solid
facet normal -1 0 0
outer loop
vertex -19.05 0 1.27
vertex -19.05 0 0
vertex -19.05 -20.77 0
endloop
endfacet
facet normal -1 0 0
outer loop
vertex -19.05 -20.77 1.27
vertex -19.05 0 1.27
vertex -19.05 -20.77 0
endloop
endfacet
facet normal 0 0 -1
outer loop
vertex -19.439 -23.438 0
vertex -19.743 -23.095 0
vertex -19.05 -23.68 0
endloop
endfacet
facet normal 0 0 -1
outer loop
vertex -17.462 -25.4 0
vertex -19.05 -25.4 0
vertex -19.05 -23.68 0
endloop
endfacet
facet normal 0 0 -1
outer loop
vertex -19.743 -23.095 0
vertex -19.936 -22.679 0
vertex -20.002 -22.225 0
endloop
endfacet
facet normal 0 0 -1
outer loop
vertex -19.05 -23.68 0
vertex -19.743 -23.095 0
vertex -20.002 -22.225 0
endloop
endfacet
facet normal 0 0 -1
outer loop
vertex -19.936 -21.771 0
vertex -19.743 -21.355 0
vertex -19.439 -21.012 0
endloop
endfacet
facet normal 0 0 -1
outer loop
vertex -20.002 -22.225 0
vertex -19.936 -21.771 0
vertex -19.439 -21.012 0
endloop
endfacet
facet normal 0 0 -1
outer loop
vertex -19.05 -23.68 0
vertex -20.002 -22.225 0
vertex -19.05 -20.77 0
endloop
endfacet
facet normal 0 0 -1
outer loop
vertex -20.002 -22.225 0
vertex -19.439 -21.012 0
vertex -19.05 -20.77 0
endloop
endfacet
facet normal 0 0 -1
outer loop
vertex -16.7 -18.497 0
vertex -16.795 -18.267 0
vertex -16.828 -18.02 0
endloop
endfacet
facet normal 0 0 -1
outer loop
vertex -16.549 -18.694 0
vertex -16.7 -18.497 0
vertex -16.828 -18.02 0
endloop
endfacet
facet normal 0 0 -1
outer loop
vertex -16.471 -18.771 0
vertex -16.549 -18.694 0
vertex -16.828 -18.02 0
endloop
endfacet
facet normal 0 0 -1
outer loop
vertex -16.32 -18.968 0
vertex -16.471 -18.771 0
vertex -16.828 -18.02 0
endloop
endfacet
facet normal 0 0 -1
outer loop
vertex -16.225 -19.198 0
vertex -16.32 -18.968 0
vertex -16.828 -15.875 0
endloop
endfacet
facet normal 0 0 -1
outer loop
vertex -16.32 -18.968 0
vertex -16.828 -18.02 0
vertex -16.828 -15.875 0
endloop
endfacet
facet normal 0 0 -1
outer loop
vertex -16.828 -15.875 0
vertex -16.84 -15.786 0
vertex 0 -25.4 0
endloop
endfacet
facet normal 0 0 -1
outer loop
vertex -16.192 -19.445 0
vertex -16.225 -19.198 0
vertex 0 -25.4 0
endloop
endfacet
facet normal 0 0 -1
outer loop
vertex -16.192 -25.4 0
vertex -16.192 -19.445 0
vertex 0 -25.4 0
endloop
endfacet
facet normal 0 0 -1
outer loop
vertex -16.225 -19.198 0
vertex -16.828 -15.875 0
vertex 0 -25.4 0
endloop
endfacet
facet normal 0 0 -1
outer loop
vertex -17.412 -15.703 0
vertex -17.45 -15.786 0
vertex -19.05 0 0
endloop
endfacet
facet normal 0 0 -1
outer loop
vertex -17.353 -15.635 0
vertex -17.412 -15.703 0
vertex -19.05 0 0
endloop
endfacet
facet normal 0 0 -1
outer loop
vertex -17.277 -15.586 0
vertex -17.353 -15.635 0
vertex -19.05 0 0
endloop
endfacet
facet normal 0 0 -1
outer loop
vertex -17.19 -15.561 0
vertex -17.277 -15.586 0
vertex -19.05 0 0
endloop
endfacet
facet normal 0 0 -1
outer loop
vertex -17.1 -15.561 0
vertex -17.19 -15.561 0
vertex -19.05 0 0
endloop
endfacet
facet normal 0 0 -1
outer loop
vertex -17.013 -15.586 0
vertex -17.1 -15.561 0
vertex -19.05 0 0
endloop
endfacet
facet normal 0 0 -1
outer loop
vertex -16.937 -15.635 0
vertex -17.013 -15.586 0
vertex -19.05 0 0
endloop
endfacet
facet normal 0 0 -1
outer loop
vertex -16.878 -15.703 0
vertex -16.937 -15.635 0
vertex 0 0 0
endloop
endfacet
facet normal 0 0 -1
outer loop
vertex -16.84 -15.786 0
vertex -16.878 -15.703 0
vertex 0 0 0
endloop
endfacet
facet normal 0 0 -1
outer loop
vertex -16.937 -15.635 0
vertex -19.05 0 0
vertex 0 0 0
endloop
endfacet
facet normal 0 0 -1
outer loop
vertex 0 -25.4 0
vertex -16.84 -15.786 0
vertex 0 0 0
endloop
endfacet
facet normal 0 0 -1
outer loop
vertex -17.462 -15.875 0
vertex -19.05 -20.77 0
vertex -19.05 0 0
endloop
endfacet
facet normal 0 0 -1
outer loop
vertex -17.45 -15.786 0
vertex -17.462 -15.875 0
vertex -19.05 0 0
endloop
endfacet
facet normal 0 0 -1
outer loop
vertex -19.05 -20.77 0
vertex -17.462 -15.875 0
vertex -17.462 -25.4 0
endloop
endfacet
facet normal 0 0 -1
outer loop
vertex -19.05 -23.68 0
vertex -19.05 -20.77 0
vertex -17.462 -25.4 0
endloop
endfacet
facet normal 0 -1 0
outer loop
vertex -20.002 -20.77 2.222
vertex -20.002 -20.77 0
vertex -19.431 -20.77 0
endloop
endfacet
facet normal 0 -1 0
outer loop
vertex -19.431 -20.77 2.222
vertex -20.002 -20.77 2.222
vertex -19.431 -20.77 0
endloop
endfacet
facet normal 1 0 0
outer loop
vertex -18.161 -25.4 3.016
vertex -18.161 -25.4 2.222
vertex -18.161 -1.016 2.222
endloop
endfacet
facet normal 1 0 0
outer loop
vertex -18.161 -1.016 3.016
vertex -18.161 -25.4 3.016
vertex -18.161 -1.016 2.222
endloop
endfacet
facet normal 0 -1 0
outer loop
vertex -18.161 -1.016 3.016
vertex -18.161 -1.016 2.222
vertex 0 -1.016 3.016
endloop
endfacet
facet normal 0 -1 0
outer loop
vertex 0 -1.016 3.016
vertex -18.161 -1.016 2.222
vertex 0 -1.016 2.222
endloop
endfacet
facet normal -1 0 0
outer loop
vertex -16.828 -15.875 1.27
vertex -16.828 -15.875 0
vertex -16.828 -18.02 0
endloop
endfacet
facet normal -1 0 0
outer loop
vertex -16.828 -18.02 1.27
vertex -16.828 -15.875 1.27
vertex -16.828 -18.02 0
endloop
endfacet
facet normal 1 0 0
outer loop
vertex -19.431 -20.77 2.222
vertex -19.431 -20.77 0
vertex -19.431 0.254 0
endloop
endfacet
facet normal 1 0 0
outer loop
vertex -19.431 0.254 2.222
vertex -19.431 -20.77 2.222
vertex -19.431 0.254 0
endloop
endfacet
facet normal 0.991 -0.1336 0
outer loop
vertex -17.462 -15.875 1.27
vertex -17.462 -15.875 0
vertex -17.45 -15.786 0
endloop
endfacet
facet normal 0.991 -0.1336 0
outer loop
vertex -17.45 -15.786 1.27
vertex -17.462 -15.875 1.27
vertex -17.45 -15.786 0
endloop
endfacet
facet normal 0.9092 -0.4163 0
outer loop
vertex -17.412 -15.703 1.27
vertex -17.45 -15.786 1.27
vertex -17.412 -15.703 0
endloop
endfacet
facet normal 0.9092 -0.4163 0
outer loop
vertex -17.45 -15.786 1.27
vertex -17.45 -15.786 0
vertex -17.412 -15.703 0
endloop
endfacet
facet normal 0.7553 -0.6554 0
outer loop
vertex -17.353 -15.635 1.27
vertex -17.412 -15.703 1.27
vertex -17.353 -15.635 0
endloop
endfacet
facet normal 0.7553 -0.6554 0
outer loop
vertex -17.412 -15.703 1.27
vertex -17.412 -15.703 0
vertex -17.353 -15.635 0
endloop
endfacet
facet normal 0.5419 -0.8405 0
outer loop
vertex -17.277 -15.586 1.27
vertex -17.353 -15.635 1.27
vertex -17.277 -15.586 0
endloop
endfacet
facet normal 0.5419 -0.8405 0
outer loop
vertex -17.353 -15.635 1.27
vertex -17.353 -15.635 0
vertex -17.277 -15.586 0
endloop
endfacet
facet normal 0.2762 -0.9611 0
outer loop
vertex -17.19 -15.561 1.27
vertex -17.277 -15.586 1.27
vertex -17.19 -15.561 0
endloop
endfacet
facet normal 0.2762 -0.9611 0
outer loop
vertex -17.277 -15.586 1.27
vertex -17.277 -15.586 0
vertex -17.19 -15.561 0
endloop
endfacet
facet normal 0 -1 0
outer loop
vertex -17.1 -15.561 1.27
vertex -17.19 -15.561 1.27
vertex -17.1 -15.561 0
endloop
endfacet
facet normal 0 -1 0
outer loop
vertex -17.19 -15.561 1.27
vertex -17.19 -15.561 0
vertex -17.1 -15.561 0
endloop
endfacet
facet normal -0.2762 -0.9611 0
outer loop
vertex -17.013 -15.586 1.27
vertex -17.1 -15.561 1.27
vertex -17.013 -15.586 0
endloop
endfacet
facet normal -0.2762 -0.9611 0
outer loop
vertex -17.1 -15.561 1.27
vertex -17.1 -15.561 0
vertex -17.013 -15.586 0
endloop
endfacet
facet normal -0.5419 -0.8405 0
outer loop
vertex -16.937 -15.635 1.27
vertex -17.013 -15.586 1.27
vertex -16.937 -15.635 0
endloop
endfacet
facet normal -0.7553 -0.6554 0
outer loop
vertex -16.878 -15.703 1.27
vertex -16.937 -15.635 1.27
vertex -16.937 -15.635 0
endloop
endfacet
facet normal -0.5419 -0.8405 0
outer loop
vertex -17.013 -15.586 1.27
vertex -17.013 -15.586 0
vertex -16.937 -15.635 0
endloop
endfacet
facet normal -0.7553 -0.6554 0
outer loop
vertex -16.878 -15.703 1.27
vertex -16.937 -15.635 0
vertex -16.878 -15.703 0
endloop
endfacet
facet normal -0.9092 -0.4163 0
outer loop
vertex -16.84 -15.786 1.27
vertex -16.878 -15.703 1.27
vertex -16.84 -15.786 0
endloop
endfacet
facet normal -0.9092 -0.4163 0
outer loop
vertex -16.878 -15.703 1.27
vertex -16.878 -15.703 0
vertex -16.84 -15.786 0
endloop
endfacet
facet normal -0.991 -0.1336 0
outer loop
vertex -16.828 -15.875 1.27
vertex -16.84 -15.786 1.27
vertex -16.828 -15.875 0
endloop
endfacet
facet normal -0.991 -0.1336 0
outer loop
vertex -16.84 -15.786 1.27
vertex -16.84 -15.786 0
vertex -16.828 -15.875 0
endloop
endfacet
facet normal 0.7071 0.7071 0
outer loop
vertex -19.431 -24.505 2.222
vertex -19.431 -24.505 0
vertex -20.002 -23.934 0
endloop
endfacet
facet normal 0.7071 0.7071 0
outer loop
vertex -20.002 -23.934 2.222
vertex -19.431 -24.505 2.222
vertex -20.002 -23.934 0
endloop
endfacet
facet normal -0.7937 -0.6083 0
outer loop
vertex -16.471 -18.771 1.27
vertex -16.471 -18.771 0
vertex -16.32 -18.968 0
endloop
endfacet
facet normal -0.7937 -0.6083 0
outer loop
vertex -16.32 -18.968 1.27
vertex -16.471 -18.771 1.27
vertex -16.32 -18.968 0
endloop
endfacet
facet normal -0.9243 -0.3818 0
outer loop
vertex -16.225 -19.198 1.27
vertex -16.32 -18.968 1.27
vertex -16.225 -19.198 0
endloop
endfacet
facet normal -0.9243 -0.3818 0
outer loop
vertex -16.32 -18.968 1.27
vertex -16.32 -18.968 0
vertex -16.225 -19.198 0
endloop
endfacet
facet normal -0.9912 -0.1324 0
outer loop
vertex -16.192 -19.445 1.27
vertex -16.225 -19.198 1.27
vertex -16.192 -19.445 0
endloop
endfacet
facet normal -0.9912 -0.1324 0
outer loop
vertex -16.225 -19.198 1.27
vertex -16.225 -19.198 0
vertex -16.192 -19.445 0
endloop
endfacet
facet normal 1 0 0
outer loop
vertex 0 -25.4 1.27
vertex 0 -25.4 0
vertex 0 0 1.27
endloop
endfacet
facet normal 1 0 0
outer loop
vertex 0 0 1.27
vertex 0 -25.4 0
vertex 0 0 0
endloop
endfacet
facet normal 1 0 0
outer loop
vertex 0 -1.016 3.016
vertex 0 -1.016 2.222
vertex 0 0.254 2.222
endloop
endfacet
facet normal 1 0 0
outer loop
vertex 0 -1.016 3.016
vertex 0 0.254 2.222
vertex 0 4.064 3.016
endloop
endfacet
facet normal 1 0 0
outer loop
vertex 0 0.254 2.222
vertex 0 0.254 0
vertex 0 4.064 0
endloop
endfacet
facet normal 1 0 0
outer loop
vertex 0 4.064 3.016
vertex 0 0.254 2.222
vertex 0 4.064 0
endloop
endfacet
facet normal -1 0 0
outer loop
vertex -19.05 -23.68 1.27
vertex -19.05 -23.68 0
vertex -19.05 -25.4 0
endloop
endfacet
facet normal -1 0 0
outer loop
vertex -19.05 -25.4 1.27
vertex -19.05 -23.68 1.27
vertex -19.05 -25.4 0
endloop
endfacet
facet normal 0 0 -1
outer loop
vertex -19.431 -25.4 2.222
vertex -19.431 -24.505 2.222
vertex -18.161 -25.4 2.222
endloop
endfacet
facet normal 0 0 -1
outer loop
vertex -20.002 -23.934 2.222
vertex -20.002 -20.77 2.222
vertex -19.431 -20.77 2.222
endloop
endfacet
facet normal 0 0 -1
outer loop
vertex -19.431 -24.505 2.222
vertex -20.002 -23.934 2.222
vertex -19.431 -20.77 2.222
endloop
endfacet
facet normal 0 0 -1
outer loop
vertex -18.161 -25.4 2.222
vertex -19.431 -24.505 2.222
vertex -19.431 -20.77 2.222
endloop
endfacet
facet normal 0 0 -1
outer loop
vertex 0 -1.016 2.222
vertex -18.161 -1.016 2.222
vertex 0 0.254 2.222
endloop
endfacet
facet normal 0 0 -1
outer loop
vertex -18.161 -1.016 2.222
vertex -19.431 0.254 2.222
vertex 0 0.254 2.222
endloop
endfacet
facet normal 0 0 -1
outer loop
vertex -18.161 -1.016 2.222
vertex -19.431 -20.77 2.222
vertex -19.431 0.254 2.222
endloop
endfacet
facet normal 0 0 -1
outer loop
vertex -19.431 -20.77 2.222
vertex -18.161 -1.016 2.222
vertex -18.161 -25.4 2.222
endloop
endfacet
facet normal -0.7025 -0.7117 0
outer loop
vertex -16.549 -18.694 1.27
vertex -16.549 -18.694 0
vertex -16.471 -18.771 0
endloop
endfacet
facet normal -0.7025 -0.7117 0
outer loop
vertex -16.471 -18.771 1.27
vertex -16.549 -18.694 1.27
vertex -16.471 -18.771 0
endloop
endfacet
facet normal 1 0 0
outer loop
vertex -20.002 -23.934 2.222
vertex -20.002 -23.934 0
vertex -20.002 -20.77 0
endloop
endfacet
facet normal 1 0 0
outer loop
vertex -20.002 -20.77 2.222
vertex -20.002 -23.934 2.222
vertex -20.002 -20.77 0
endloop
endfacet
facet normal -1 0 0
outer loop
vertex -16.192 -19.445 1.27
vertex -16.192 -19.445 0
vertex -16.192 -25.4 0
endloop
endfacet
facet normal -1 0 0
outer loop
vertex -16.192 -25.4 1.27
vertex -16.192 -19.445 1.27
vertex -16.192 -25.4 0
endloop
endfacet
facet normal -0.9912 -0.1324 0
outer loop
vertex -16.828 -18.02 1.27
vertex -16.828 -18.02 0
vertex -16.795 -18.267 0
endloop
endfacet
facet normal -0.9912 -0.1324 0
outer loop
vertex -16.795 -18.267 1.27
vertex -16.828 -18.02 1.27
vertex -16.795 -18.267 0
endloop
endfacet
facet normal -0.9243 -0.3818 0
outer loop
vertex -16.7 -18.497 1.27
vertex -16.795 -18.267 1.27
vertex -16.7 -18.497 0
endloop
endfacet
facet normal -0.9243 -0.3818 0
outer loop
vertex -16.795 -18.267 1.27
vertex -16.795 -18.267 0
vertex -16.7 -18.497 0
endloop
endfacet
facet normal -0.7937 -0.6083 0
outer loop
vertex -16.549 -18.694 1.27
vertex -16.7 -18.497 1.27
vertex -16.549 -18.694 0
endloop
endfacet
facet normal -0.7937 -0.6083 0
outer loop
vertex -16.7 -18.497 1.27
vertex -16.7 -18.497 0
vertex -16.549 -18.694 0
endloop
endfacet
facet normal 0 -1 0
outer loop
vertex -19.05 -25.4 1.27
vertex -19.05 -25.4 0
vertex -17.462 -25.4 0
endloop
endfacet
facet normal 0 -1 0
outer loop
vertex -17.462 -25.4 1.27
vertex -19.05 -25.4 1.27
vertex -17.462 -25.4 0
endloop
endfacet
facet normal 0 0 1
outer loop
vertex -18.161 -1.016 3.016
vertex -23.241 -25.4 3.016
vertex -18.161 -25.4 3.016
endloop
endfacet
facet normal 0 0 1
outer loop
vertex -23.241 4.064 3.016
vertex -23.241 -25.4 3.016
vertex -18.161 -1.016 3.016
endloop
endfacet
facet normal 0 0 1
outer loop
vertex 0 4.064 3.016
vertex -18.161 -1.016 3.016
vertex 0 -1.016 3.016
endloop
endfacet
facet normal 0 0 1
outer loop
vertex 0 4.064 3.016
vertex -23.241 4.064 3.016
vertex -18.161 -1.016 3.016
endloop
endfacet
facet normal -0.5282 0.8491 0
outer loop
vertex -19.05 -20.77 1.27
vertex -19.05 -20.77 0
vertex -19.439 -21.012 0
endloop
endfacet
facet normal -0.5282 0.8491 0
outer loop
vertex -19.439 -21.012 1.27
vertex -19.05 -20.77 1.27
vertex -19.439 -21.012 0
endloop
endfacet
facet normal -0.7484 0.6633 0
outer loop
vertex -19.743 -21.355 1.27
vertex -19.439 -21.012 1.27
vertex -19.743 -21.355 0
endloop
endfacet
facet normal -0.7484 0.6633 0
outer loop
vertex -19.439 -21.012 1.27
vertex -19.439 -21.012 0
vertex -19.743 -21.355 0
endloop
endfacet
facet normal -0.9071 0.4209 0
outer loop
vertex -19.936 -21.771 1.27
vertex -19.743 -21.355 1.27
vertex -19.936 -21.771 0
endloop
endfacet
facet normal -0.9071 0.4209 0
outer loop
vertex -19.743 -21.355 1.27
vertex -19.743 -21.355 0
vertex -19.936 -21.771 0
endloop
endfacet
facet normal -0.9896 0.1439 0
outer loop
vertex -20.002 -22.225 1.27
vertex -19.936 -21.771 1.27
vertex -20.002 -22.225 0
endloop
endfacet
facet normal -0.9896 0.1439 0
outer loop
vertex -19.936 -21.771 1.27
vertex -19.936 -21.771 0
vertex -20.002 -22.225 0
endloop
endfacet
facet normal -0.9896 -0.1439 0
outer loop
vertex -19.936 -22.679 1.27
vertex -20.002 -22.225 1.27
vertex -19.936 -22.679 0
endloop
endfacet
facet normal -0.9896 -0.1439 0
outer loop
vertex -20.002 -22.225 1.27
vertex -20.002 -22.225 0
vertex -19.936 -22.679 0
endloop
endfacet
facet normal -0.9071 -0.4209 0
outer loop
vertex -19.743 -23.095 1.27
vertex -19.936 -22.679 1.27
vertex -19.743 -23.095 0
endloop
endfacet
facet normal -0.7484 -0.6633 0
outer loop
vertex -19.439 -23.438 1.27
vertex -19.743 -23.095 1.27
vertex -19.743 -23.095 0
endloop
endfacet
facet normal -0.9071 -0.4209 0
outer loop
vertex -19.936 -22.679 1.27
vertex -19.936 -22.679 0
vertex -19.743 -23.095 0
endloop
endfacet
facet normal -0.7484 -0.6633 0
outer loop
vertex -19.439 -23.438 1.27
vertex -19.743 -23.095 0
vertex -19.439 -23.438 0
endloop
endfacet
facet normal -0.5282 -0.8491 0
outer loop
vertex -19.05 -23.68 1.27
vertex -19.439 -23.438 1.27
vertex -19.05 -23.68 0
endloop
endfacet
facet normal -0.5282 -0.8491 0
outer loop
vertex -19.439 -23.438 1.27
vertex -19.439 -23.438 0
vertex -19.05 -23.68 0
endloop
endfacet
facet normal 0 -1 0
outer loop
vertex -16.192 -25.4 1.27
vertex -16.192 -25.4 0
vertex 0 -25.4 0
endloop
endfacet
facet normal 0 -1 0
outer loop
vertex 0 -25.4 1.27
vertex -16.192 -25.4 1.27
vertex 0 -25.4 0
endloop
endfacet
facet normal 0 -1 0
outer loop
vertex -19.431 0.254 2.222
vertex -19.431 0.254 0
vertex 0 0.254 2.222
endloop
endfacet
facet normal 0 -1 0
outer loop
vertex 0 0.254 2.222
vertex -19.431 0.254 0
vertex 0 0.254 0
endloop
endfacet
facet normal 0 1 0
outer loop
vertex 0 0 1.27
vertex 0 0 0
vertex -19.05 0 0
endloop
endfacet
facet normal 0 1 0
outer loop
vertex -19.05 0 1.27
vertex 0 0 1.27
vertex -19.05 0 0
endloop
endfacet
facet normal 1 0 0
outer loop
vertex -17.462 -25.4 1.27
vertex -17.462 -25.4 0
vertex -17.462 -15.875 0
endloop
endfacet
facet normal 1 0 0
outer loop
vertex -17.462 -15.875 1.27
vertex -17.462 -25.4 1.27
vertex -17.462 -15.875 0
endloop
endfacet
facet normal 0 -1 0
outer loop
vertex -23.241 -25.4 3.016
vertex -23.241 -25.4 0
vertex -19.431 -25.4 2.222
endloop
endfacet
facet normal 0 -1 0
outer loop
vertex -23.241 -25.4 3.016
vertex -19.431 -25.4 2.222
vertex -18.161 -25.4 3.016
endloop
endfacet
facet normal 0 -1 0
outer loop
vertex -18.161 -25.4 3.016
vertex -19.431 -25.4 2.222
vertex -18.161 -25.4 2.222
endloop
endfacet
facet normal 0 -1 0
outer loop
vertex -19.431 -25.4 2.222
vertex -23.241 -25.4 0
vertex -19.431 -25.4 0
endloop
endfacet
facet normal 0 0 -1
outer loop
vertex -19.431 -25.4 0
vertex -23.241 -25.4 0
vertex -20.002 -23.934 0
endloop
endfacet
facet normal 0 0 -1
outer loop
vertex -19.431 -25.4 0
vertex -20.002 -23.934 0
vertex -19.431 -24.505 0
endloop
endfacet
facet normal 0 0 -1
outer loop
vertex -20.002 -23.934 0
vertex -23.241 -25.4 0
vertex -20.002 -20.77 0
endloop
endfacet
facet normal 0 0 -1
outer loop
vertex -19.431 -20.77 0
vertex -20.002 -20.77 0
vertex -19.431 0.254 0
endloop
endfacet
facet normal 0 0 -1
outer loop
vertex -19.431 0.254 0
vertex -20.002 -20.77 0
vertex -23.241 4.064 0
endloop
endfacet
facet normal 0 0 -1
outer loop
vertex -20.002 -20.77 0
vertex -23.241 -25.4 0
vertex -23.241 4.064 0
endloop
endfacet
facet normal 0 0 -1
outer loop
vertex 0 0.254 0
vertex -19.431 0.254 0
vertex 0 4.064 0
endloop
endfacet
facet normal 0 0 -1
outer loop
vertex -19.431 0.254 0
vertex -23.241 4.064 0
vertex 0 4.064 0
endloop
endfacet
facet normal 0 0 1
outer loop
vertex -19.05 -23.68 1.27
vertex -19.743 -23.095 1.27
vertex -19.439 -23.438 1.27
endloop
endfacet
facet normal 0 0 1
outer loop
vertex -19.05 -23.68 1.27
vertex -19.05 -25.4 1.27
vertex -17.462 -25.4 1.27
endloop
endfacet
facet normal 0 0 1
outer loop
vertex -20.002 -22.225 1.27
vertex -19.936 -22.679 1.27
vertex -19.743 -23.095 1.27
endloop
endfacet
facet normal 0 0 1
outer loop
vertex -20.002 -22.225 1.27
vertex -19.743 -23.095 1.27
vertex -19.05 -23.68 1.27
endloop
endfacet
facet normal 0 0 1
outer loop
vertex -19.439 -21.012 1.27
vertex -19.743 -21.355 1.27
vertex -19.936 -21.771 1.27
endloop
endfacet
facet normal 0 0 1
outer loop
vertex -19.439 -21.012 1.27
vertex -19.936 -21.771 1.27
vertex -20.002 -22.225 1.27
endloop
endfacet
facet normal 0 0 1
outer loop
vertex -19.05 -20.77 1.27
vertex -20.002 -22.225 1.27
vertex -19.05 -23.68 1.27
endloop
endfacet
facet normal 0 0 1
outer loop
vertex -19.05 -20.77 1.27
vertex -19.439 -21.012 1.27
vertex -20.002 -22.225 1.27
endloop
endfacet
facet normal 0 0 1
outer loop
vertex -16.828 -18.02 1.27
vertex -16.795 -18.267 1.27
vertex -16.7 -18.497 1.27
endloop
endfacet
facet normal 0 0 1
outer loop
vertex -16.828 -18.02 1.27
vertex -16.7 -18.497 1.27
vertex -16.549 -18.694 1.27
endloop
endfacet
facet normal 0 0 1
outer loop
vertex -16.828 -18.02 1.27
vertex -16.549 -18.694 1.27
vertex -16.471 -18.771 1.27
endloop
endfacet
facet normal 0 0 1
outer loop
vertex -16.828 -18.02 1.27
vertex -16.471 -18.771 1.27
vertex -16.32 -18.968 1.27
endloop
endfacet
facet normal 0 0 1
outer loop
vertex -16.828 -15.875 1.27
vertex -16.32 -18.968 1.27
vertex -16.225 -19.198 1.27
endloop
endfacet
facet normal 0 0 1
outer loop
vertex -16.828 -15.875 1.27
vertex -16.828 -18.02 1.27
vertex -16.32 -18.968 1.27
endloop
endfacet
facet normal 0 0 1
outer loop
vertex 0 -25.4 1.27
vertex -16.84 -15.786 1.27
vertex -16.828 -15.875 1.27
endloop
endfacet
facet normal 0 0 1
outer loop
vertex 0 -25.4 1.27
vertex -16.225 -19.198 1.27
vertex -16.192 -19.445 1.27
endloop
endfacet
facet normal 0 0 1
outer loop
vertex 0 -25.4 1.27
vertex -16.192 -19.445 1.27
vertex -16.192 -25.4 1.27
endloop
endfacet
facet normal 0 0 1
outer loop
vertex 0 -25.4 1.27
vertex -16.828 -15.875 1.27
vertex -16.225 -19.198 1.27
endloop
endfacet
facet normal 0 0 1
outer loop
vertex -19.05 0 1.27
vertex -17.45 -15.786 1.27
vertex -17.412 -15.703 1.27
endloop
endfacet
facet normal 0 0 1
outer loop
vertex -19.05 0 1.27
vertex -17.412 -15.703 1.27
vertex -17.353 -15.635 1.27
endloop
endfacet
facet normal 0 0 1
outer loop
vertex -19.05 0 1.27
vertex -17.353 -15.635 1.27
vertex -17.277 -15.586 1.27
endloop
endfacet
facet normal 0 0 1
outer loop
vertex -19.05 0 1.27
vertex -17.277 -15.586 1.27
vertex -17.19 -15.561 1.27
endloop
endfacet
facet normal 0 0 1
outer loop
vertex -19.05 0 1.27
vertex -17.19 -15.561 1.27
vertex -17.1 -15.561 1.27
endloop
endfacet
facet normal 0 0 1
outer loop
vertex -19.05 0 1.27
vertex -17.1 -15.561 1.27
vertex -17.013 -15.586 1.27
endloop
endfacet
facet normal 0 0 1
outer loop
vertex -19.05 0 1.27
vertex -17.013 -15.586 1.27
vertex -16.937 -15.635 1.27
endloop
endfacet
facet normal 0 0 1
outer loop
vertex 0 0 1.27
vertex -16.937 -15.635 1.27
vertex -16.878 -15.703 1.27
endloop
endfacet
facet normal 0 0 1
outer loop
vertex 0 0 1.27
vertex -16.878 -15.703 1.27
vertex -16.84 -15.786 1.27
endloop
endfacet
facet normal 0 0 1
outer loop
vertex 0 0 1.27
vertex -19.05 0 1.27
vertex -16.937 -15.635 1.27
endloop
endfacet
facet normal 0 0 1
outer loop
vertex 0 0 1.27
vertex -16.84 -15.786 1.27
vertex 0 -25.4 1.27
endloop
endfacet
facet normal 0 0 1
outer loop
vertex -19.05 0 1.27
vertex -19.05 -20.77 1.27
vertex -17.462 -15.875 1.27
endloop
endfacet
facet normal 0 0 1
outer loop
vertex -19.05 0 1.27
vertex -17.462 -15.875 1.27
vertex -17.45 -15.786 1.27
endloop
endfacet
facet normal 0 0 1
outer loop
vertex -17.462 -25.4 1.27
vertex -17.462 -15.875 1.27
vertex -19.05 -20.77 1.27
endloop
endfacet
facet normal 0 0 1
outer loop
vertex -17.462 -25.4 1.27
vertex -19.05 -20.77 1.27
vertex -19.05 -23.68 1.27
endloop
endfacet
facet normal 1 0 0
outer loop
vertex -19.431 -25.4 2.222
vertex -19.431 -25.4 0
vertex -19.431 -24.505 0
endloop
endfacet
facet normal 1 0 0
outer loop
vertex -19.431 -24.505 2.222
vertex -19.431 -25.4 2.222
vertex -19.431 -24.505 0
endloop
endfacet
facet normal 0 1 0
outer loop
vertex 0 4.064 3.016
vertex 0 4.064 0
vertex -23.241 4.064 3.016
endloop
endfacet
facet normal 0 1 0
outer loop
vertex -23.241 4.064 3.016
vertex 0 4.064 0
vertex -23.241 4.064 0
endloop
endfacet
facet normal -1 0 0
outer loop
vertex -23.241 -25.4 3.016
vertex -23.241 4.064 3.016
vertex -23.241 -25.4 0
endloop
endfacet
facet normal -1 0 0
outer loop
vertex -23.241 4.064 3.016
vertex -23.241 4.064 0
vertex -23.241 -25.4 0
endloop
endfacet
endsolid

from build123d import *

# Parameters (mm, degrees)
F1_DEPTH = 1.27
F3_DEPTH = 2.2225
F5_DEPTH = 0.79375


# Not quite as in the source:
# - a feature of the source that left no trace in its solid (it failed there, or was rolled back) is left out


with BuildPart() as f1:
    # F0 (on Top) → F1 (new body)
    with BuildSketch(Plane.XY):
        with BuildLine():
            Line((0, -25.4), (0, 0))
            Line((0, 0), (-19.05, 0))
            Line((-19.05, 0), (-19.05, -20.7700322169))
            ThreePointArc((-19.05, -20.7700322169), (-20.0025, -22.225), (-19.05, -23.6799677831))
            Line((-19.05, -23.6799677831), (-19.05, -25.4))
            Line((-19.05, -25.4), (-17.4625, -25.4))
            Line((-17.4625, -25.4), (-17.4625, -15.875))
            ThreePointArc((-17.4625, -15.875), (-17.145, -15.5575), (-16.8275, -15.875))
            Line((-16.8275, -15.875), (-16.8275, -18.0204615818))
            ThreePointArc((-16.8275, -18.0204615818), (-16.7549952547, -18.3849675512), (-16.5485192091, -18.6939807909))
            Line((-16.5485192091, -18.6939807909), (-16.4714807909, -18.7710192091))
            ThreePointArc((-16.4714807909, -18.7710192091), (-16.2650047453, -19.0800324488), (-16.1925, -19.4445384182))
            Line((-16.1925, -19.4445384182), (-16.1925, -25.4))
            Line((-16.1925, -25.4), (0, -25.4))
        make_face()
    extrude(amount=F1_DEPTH)


with BuildPart() as f3:
    # F2 (on Top) → F3 (new body)
    with BuildSketch(Plane.XY):
        Polygon((-23.241, -25.4), (-19.431, -25.4), (-19.431, -24.5054677831), (-20.0025, -23.9339677831), (-20.0025, -20.7700322169), (-19.431, -20.7700322169), (-19.431, 0.254), (0, 0.254), (0, 4.064), (-23.241, 4.064), align=None)
    extrude(amount=F3_DEPTH)

    # F4 (on face) → F5 (join)
    with BuildSketch(Plane.XY.offset(2.2225)):
        Polygon((0, -1.016), (0, 4.064), (-23.241, 4.064), (-23.241, -25.4), (-18.161, -25.4), (-18.161, -1.016), align=None)
    extrude(amount=F5_DEPTH)


solid = Compound([f1.part, f3.part])
